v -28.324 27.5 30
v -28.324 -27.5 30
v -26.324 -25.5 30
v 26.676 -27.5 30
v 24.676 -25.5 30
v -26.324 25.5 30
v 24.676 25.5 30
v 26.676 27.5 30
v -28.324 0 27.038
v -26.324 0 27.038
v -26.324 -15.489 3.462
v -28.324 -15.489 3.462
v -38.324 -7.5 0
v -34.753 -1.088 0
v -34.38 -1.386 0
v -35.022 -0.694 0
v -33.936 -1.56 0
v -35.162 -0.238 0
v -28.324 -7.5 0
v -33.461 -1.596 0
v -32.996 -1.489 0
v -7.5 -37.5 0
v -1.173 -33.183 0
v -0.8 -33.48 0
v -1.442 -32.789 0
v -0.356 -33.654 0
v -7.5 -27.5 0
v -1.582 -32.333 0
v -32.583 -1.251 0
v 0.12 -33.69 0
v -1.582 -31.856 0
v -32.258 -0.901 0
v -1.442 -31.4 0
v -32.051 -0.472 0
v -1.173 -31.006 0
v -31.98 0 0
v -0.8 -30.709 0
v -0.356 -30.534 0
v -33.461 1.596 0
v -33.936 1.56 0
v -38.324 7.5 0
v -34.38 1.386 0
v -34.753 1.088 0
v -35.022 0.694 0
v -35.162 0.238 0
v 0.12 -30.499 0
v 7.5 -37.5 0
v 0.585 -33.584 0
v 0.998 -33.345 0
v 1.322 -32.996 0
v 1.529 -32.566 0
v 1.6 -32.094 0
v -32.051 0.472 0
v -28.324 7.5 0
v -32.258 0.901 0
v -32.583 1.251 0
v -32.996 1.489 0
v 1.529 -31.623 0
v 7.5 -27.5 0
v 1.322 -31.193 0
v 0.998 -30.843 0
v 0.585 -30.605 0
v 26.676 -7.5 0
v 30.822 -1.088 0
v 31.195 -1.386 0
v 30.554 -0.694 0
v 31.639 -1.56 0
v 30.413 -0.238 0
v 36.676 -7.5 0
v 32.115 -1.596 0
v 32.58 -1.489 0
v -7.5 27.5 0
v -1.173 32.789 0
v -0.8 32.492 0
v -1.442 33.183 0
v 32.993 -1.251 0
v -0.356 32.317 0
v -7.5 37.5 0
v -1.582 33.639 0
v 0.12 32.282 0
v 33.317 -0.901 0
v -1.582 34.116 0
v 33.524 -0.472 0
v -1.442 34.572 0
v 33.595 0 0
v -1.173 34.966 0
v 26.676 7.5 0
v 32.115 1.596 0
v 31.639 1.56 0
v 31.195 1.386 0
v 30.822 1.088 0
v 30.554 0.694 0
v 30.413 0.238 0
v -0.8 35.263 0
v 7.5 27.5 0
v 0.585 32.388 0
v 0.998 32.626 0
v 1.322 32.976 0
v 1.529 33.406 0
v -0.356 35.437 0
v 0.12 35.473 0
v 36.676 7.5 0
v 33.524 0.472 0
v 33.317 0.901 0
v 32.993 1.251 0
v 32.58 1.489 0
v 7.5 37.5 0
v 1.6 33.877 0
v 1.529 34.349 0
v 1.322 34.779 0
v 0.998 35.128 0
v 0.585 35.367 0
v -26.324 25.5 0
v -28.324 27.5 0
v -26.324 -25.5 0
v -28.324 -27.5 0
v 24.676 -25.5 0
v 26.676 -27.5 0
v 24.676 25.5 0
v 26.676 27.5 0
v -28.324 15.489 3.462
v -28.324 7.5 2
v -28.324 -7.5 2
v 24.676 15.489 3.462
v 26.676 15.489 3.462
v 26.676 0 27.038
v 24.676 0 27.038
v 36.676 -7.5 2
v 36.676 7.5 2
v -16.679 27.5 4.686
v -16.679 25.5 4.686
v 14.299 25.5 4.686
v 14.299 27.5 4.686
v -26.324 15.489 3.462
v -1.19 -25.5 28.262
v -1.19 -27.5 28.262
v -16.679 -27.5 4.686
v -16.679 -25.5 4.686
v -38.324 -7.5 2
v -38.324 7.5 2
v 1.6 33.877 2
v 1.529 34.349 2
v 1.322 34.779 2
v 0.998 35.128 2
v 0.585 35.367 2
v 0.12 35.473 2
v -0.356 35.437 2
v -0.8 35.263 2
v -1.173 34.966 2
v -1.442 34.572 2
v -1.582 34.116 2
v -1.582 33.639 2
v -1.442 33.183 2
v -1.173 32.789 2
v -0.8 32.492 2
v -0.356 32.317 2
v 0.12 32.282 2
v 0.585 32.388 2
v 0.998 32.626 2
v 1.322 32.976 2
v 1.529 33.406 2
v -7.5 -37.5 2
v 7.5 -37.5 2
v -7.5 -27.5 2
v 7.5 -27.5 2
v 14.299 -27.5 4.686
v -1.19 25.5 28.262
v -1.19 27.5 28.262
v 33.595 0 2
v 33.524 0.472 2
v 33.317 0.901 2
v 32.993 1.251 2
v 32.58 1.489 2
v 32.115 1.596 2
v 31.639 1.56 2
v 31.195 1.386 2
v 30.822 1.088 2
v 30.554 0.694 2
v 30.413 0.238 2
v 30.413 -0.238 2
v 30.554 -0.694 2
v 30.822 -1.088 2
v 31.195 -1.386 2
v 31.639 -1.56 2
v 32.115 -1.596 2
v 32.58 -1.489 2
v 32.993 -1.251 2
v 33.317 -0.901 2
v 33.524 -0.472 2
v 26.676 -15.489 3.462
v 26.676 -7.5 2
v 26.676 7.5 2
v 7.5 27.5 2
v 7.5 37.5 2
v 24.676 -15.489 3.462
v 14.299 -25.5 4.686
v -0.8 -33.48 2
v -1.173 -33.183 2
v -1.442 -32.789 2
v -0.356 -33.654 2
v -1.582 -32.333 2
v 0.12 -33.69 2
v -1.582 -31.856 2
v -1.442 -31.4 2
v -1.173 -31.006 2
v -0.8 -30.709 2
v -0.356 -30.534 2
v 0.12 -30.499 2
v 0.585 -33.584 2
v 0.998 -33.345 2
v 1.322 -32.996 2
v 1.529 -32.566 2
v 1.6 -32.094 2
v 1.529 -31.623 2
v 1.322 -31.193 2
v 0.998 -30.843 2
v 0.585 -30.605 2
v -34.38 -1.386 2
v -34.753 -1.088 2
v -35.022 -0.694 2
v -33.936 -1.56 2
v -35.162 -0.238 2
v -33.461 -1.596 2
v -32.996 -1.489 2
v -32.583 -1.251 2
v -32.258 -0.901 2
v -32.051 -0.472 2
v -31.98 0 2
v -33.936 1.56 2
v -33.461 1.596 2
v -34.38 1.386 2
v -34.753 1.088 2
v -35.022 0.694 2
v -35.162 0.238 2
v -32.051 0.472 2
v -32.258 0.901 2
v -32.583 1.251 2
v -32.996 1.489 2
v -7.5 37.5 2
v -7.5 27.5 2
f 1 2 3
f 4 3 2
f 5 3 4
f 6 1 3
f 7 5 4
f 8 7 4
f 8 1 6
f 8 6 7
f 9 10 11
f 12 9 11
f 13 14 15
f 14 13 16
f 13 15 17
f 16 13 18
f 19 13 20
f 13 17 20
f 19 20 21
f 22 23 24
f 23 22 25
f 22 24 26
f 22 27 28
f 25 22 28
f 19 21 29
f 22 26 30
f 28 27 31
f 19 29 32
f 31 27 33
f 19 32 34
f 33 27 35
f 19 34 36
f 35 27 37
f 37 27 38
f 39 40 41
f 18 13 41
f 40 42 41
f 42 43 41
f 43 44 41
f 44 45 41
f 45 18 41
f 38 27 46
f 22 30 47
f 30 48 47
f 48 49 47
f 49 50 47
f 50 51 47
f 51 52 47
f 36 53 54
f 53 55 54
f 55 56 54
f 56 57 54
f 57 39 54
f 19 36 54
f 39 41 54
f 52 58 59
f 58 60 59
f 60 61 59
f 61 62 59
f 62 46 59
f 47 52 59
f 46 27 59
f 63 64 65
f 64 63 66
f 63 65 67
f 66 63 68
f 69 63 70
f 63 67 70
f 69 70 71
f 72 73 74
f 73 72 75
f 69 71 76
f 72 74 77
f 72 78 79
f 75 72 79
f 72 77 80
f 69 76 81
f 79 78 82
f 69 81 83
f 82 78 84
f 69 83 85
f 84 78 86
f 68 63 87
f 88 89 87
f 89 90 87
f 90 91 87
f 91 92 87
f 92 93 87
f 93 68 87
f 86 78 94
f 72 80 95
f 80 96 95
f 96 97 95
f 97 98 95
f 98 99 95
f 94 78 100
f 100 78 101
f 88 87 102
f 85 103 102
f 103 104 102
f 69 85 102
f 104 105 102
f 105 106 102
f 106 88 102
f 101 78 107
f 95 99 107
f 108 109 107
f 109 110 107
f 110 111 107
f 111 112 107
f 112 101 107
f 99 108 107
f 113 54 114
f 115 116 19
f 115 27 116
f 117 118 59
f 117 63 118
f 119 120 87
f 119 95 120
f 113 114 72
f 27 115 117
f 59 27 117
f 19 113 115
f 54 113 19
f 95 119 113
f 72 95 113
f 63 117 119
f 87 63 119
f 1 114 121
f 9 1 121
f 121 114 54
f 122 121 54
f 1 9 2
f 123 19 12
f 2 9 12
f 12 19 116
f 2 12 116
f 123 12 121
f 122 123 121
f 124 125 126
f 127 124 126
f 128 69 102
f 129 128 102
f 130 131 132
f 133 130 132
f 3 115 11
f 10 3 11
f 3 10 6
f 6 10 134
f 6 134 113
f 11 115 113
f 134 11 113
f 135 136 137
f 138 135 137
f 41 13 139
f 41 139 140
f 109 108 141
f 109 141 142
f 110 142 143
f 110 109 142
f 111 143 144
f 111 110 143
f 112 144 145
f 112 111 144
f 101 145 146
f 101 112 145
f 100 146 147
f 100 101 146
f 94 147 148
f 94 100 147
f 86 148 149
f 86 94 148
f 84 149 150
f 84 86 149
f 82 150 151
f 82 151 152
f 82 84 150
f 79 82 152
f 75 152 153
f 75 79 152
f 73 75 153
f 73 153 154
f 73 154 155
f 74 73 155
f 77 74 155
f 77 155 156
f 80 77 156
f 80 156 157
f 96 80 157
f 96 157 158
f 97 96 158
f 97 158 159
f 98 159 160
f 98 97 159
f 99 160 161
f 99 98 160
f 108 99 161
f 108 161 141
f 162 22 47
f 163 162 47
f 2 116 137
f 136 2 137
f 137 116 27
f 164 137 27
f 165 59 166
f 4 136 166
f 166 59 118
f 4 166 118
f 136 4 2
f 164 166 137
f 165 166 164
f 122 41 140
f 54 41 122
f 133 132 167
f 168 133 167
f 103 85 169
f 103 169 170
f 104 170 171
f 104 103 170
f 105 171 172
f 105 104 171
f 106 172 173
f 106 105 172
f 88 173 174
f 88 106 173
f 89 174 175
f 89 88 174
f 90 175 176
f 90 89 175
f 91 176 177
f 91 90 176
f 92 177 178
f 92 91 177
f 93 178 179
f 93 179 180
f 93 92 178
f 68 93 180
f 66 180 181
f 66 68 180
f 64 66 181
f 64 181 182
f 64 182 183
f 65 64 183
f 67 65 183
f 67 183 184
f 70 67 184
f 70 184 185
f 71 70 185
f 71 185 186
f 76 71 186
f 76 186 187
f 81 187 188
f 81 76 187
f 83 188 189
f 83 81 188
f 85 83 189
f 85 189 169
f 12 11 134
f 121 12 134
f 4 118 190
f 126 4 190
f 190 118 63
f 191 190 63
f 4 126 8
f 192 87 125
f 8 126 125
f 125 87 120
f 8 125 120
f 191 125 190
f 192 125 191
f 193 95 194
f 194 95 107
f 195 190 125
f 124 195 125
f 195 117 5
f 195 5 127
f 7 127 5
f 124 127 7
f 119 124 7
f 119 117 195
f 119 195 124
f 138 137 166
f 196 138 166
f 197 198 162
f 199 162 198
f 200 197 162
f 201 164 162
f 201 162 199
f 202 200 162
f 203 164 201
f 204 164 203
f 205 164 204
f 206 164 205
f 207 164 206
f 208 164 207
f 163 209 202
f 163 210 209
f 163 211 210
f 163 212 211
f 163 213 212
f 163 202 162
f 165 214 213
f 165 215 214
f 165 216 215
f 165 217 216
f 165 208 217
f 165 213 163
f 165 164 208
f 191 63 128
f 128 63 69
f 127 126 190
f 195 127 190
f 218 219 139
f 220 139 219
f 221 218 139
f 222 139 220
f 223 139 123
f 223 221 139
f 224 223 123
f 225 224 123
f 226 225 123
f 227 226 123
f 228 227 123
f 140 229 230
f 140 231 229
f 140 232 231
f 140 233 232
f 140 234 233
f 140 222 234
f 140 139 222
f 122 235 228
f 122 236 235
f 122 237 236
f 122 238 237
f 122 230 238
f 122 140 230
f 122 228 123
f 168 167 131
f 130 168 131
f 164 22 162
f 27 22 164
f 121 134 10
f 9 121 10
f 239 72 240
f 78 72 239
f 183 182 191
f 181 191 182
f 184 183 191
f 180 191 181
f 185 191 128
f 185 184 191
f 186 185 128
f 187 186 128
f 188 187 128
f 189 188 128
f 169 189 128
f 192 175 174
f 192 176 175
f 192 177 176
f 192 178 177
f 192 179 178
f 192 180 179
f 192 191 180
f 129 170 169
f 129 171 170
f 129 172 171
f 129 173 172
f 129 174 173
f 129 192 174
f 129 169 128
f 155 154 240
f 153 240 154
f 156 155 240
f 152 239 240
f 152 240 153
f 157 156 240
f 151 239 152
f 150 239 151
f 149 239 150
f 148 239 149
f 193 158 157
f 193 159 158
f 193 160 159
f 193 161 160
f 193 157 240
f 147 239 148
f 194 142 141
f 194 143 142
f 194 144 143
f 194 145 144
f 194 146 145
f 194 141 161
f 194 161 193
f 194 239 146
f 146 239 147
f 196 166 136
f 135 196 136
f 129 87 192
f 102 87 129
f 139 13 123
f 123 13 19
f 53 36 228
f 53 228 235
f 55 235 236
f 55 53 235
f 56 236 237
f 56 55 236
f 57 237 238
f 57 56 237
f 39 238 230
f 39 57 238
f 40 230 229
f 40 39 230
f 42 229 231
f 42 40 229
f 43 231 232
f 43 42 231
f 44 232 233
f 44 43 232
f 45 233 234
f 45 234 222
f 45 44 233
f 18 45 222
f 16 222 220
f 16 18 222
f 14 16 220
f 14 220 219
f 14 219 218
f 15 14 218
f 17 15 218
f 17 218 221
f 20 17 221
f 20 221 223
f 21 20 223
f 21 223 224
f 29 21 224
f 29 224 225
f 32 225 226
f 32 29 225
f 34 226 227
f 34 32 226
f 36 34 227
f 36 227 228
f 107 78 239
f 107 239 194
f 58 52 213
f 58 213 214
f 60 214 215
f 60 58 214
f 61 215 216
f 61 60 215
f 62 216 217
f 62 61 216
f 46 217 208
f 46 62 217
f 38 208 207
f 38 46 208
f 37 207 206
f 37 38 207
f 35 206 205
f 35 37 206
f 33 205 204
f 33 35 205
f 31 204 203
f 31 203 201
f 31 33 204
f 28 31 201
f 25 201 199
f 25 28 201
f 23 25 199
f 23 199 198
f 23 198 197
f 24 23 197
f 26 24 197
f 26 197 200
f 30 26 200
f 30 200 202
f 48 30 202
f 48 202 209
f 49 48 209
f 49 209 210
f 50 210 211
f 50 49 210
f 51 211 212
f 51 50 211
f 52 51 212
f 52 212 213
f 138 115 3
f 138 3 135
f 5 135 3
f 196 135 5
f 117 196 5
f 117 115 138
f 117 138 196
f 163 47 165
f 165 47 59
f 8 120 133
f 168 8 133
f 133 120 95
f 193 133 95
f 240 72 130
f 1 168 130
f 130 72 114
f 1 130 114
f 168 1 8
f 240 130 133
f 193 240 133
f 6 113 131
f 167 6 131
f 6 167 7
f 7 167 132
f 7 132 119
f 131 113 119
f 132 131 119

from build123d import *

# Parameters (mm, degrees)
F0_W     = 51
F0_H     = 51
F1_DEPTH = 30
F0_W_2   = 15
F0_H_2   = 10
F0_R     = 1.6
F0_W_3   = 10
F0_H_3   = 15
F2_DEPTH = 2
F4_DEPTH = 100
F6_DEPTH = 100


with BuildPart() as f1:
    # F0 (on Top) → F1 (new body)
    with BuildSketch(Plane.XY):
        Polygon((-7.5, 27.5), (-28.323529, 27.5), (-28.323529, 7.5), (-28.323529, -7.5), (-28.323529, -27.5), (-7.5, -27.5), (7.5, -27.5), (26.676471, -27.5), (26.676471, -7.5), (26.676471, 7.5), (26.676471, 27.5), (7.5, 27.5), align=None)
        with Locations((-0.823529, 0)):
            Rectangle(F0_W, F0_H, mode=Mode.SUBTRACT)
    extrude(amount=F1_DEPTH)

    # F0 (on Top) → F2 (join)
    with BuildSketch(Plane.XY):
        with Locations((0, 32.5)):
            Rectangle(F0_W_2, F0_H_2)
        with Locations((0, 33.877362)):
            Circle(F0_R, mode=Mode.SUBTRACT)
        with Locations((31.676471, 0)):
            Rectangle(F0_W_3, F0_H_3)
        with Locations((31.995282, 0)):
            Circle(F0_R, mode=Mode.SUBTRACT)
        with Locations((0, -32.5)):
            Rectangle(F0_W_2, F0_H_2)
        with Locations((0, -32.094341)):
            Circle(F0_R, mode=Mode.SUBTRACT)
        with Locations((-33.323529, 0)):
            Rectangle(F0_W_3, F0_H_3)
        with Locations((-33.580191, 0)):
            Circle(F0_R, mode=Mode.SUBTRACT)
    extrude(amount=F2_DEPTH)

    # F3 (on face) → F4 (cut)
    with BuildSketch(Plane.YZ.offset(26.676471)):
        Polygon((15.488846, 3.462488), (0, 27.03796), (-15.488846, 3.462488), align=None)
    extrude(amount=-F4_DEPTH, mode=Mode.SUBTRACT)

    # F5 (on face) → F6 (cut)
    with BuildSketch(Plane.XZ.offset(27.5)):
        Polygon((14.299098, 4.686049), (-1.189748, 28.261521), (-16.678594, 4.686049), align=None)
    extrude(amount=-F6_DEPTH, mode=Mode.SUBTRACT)


solid = f1.part
